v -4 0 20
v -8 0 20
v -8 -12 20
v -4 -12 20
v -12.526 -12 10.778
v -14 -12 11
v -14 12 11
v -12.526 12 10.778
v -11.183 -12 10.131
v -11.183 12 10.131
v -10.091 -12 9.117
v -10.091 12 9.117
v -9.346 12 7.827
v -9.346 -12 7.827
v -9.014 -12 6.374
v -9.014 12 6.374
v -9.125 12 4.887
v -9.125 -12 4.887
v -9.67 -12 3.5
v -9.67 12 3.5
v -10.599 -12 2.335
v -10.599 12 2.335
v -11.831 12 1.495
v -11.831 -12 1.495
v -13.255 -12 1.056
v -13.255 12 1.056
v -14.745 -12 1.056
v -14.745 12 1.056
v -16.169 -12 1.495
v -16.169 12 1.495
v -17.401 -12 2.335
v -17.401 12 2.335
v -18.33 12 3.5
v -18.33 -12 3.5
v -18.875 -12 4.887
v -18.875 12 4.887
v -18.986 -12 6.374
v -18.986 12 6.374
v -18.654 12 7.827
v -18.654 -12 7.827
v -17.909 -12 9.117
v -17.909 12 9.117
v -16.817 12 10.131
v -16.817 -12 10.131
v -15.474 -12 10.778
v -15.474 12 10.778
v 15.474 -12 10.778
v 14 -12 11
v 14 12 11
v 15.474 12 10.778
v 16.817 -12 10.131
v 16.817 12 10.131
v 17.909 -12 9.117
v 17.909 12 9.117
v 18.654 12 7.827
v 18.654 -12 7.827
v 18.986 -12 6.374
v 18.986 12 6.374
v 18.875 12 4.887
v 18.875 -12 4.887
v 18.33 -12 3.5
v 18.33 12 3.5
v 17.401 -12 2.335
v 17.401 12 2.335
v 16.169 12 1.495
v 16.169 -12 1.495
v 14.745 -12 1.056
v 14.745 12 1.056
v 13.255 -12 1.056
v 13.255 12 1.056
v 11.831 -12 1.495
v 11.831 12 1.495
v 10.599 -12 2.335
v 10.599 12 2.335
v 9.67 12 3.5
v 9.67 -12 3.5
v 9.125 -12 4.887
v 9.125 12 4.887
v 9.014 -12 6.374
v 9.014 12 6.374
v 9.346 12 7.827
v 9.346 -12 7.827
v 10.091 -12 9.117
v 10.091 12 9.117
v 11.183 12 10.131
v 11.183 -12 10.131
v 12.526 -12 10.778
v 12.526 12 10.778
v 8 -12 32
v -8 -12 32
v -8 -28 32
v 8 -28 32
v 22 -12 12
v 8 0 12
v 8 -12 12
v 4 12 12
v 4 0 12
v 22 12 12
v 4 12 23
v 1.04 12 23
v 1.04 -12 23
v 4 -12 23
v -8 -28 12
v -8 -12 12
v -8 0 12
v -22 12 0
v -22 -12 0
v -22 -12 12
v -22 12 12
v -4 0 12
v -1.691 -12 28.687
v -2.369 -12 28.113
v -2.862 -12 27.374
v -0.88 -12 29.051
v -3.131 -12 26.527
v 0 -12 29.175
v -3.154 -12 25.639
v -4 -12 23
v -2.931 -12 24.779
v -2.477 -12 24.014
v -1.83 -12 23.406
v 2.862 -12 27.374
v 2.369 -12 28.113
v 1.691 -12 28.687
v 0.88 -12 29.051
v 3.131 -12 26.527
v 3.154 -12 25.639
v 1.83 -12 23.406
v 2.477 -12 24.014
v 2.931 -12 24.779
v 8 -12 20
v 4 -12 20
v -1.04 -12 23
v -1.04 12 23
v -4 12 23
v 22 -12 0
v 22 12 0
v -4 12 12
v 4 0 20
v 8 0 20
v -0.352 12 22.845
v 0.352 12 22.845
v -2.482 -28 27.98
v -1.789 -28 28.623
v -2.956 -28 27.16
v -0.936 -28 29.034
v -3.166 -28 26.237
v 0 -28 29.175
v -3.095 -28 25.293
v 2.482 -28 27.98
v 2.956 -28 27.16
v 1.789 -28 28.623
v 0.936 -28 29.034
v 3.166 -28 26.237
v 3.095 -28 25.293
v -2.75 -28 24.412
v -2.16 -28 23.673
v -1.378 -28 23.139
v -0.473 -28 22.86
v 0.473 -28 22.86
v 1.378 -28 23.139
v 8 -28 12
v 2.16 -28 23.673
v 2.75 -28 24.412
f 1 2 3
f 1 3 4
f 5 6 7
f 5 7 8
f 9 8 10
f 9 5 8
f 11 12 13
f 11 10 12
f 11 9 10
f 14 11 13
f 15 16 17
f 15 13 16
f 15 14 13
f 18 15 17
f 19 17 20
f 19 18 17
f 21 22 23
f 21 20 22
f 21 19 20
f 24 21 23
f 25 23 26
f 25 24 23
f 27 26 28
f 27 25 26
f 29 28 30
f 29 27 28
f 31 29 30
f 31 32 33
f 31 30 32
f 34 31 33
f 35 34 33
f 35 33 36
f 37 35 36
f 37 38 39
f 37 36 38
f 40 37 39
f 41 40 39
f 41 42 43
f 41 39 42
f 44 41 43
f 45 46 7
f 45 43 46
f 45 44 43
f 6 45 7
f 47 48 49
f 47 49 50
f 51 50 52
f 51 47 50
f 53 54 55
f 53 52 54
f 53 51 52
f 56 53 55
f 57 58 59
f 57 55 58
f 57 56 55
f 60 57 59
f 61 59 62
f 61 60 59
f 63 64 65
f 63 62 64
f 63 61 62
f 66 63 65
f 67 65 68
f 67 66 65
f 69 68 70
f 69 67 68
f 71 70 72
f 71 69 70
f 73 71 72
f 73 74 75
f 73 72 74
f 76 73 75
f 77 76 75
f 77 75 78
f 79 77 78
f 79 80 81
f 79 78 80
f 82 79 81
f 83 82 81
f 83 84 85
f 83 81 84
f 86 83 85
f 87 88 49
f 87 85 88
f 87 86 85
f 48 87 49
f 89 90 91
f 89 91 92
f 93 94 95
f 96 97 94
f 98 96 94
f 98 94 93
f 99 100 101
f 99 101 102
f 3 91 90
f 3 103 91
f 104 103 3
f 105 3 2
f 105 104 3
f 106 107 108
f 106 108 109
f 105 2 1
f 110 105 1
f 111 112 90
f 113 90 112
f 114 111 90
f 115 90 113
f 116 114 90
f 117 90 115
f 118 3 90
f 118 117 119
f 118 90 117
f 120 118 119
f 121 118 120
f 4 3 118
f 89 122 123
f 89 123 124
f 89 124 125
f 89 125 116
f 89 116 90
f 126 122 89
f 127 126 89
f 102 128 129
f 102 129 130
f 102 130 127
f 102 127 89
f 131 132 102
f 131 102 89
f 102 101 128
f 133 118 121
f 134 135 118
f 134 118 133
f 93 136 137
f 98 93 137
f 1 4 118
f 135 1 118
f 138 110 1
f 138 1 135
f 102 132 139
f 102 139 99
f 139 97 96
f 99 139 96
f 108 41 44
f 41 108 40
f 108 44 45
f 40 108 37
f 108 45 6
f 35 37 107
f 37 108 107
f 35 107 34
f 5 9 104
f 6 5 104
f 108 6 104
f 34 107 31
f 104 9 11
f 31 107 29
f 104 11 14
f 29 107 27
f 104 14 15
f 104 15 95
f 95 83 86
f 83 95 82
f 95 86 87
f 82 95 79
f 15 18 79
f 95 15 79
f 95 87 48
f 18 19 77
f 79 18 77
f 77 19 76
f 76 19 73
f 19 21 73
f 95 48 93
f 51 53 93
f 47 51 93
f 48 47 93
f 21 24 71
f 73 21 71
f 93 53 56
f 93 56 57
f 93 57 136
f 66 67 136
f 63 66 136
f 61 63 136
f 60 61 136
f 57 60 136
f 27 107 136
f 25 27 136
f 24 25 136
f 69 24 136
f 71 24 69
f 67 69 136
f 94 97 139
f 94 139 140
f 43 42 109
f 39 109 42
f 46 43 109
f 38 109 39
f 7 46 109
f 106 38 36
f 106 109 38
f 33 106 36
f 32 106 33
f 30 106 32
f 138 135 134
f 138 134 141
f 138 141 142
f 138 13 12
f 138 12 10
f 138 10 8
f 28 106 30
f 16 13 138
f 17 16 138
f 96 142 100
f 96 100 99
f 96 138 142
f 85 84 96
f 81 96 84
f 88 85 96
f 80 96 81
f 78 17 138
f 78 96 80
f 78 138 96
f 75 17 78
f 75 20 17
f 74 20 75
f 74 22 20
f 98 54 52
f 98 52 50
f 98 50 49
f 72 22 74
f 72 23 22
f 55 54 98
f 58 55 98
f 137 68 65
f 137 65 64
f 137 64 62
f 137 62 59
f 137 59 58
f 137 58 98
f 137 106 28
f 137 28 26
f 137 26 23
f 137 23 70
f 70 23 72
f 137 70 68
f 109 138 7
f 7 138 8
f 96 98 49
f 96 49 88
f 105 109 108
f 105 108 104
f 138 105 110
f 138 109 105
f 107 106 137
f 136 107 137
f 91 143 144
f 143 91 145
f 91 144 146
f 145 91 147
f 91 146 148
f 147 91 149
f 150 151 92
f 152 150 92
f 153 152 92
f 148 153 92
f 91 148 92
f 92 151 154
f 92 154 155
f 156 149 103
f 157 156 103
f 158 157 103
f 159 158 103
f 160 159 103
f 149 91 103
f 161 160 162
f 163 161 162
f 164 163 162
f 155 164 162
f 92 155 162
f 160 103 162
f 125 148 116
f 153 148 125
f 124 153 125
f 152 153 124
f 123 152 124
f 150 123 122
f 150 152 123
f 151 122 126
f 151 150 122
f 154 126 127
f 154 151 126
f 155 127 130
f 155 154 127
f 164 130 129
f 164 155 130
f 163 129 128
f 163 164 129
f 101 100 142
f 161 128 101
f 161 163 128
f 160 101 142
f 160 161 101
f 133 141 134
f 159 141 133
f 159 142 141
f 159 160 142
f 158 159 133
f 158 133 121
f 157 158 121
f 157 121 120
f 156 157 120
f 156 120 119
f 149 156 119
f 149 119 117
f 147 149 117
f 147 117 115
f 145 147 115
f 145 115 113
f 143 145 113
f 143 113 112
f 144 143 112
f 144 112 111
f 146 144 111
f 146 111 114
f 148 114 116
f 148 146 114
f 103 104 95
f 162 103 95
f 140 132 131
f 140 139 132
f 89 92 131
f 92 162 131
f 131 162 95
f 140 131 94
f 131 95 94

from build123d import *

# Parameters (mm, degrees)
SKETCH1_W                                   = 44
SKETCH1_H                                   = 24
CROSSHEAD_BASE_DEPTH                        = 12
SHOE_UPRISER_START                          = 12
SKETCH2_W                                   = 8
SKETCH2_H                                   = 24
SHOE_UPRISER_DEPTH                          = 11
ADAPTER_BRIDGE_START                        = 12
SKETCH3_W                                   = 16
SKETCH3_H                                   = 28
ADAPTER_BRIDGE_DEPTH                        = 8
THREADED_ROD_ADAPTER_START                  = 20
SKETCH4_W                                   = 16
SKETCH4_H                                   = 16
THREADED_ROD_ADAPTER_DEPTH                  = 12
TWO_BRONZE_BUSH_HOUSINGS_DEPTH              = 48.874836814
TWO_BRONZE_BUSH_HOUSINGS_DEPTH_BACK         = 48.874836814
SKETCH5_R                                   = 5
QUARTER20_ADAPTER_MAJOR_ENVELOPE_DEPTH      = 48.874836814
QUARTER20_ADAPTER_MAJOR_ENVELOPE_DEPTH_BACK = 48.874836814
SKETCH6_R                                   = 3.175


with BuildPart() as part:
    # Sketch1 → Crosshead_Base (new body)
    with BuildSketch(Plane.XY):
        Rectangle(SKETCH1_W, SKETCH1_H)
    extrude(amount=CROSSHEAD_BASE_DEPTH)

    # Sketch2 → Shoe_Upriser (add)
    with BuildSketch(Plane.XY.offset(SHOE_UPRISER_START)):
        Rectangle(SKETCH2_W, SKETCH2_H)
    extrude(amount=SHOE_UPRISER_DEPTH)

    # Sketch3 → Adapter_Bridge (add)
    with BuildSketch(Plane.XY.offset(ADAPTER_BRIDGE_START)):
        with Locations((0, -14)):
            Rectangle(SKETCH3_W, SKETCH3_H)
    extrude(amount=ADAPTER_BRIDGE_DEPTH)

    # Sketch4 → Threaded_Rod_Adapter (add)
    with BuildSketch(Plane.XY.offset(THREADED_ROD_ADAPTER_START)):
        with Locations((0, -20)):
            Rectangle(SKETCH4_W, SKETCH4_H)
    extrude(amount=THREADED_ROD_ADAPTER_DEPTH)

    # Sketch5 → Two_Bronze_Bush_Housings (cut, two sides: drawn at the far end of the back side and taken through both)
    with BuildSketch(Plane(origin=(0, 0, 0), x_dir=(1, 0, 0), z_dir=(0, 1, 0)).offset(-TWO_BRONZE_BUSH_HOUSINGS_DEPTH_BACK)):
        with Locations(Location((-14, -6, 0), (0, 0, 270))):
            Circle(SKETCH5_R)
        with Locations(Location((14, -6, 0), (0, 0, 270))):
            Circle(SKETCH5_R)
    extrude(amount=TWO_BRONZE_BUSH_HOUSINGS_DEPTH + TWO_BRONZE_BUSH_HOUSINGS_DEPTH_BACK, mode=Mode.SUBTRACT)

    # Sketch6 → Quarter20_Adapter_Major_Envelope (cut, two sides: drawn at the far end of the back side and taken through both)
    with BuildSketch(Plane(origin=(0, 0, 0), x_dir=(1, 0, 0), z_dir=(0, 1, 0)).offset(-QUARTER20_ADAPTER_MAJOR_ENVELOPE_DEPTH_BACK)):
        with Locations(Location((0, -26, 0), (0, 0, 270))):
            Circle(SKETCH6_R)
    extrude(amount=QUARTER20_ADAPTER_MAJOR_ENVELOPE_DEPTH + QUARTER20_ADAPTER_MAJOR_ENVELOPE_DEPTH_BACK, mode=Mode.SUBTRACT)


solid = part.part
